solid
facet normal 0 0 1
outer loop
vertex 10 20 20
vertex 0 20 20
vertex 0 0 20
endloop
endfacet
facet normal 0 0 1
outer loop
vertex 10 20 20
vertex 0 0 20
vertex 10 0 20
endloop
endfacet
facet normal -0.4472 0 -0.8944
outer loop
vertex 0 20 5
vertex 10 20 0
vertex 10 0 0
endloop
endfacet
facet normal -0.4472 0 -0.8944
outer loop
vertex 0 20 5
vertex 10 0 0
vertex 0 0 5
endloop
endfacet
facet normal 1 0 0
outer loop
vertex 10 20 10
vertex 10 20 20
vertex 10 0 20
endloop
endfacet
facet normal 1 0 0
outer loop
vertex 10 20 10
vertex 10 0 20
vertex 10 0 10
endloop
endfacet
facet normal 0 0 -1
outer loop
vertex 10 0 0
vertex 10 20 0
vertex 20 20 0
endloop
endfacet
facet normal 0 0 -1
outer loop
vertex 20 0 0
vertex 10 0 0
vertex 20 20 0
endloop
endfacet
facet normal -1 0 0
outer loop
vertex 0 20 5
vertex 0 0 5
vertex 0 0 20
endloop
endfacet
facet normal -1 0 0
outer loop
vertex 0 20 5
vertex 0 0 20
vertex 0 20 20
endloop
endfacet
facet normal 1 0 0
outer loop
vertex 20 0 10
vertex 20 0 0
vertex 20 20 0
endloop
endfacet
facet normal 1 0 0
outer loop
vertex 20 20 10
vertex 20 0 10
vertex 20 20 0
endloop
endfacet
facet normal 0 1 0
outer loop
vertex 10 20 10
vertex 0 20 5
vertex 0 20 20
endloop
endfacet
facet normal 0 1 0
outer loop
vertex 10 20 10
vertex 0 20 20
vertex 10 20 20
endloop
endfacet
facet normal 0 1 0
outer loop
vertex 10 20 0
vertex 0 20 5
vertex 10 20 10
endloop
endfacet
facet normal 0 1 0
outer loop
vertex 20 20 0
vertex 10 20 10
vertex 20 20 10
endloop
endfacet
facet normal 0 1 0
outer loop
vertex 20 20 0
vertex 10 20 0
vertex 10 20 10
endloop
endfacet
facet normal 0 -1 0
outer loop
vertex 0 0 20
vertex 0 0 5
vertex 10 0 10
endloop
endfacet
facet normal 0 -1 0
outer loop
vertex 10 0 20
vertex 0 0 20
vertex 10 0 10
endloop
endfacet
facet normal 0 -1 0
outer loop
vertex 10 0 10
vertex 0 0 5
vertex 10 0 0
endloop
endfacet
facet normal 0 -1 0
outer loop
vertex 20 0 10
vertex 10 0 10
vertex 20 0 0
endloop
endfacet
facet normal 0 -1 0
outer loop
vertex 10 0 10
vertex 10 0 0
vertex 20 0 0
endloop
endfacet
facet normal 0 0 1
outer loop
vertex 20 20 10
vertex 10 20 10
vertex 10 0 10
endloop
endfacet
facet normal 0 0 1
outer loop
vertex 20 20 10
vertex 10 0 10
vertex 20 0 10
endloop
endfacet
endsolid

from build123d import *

# Parameters (mm, degrees)
SKETCH1_W           = 20
SKETCH1_H           = 20
BOSS_EXTRUDE1_DEPTH = 20
SKETCH2_W           = 10
SKETCH2_H           = 10
CUT_EXTRUDE1_DEPTH  = 20
CUT_EXTRUDE2_DEPTH  = 20


with BuildPart() as part:
    # Sketch1 → Boss-Extrude1 (new body)
    with BuildSketch(Plane.XY):
        with Locations((10, 10)):
            Rectangle(SKETCH1_W, SKETCH1_H)
    extrude(amount=BOSS_EXTRUDE1_DEPTH)

    # Sketch2 → Cut-Extrude1 (cut)
    with BuildSketch(Plane(origin=(0, 20, 0), x_dir=(1, 0, 0), z_dir=(0, 1, 0))):
        with Locations((15, -15)):
            Rectangle(SKETCH2_W, SKETCH2_H)
    extrude(amount=-CUT_EXTRUDE1_DEPTH, mode=Mode.SUBTRACT)

    # Sketch3 → Cut-Extrude2 (cut)
    with BuildSketch(Plane(origin=(0, 20, 0), x_dir=(1, 0, 0), z_dir=(0, 1, 0))):
        Polygon((0, 0), (10, 0), (0, -5), align=None)
    extrude(amount=-CUT_EXTRUDE2_DEPTH, mode=Mode.SUBTRACT)


solid = part.part
